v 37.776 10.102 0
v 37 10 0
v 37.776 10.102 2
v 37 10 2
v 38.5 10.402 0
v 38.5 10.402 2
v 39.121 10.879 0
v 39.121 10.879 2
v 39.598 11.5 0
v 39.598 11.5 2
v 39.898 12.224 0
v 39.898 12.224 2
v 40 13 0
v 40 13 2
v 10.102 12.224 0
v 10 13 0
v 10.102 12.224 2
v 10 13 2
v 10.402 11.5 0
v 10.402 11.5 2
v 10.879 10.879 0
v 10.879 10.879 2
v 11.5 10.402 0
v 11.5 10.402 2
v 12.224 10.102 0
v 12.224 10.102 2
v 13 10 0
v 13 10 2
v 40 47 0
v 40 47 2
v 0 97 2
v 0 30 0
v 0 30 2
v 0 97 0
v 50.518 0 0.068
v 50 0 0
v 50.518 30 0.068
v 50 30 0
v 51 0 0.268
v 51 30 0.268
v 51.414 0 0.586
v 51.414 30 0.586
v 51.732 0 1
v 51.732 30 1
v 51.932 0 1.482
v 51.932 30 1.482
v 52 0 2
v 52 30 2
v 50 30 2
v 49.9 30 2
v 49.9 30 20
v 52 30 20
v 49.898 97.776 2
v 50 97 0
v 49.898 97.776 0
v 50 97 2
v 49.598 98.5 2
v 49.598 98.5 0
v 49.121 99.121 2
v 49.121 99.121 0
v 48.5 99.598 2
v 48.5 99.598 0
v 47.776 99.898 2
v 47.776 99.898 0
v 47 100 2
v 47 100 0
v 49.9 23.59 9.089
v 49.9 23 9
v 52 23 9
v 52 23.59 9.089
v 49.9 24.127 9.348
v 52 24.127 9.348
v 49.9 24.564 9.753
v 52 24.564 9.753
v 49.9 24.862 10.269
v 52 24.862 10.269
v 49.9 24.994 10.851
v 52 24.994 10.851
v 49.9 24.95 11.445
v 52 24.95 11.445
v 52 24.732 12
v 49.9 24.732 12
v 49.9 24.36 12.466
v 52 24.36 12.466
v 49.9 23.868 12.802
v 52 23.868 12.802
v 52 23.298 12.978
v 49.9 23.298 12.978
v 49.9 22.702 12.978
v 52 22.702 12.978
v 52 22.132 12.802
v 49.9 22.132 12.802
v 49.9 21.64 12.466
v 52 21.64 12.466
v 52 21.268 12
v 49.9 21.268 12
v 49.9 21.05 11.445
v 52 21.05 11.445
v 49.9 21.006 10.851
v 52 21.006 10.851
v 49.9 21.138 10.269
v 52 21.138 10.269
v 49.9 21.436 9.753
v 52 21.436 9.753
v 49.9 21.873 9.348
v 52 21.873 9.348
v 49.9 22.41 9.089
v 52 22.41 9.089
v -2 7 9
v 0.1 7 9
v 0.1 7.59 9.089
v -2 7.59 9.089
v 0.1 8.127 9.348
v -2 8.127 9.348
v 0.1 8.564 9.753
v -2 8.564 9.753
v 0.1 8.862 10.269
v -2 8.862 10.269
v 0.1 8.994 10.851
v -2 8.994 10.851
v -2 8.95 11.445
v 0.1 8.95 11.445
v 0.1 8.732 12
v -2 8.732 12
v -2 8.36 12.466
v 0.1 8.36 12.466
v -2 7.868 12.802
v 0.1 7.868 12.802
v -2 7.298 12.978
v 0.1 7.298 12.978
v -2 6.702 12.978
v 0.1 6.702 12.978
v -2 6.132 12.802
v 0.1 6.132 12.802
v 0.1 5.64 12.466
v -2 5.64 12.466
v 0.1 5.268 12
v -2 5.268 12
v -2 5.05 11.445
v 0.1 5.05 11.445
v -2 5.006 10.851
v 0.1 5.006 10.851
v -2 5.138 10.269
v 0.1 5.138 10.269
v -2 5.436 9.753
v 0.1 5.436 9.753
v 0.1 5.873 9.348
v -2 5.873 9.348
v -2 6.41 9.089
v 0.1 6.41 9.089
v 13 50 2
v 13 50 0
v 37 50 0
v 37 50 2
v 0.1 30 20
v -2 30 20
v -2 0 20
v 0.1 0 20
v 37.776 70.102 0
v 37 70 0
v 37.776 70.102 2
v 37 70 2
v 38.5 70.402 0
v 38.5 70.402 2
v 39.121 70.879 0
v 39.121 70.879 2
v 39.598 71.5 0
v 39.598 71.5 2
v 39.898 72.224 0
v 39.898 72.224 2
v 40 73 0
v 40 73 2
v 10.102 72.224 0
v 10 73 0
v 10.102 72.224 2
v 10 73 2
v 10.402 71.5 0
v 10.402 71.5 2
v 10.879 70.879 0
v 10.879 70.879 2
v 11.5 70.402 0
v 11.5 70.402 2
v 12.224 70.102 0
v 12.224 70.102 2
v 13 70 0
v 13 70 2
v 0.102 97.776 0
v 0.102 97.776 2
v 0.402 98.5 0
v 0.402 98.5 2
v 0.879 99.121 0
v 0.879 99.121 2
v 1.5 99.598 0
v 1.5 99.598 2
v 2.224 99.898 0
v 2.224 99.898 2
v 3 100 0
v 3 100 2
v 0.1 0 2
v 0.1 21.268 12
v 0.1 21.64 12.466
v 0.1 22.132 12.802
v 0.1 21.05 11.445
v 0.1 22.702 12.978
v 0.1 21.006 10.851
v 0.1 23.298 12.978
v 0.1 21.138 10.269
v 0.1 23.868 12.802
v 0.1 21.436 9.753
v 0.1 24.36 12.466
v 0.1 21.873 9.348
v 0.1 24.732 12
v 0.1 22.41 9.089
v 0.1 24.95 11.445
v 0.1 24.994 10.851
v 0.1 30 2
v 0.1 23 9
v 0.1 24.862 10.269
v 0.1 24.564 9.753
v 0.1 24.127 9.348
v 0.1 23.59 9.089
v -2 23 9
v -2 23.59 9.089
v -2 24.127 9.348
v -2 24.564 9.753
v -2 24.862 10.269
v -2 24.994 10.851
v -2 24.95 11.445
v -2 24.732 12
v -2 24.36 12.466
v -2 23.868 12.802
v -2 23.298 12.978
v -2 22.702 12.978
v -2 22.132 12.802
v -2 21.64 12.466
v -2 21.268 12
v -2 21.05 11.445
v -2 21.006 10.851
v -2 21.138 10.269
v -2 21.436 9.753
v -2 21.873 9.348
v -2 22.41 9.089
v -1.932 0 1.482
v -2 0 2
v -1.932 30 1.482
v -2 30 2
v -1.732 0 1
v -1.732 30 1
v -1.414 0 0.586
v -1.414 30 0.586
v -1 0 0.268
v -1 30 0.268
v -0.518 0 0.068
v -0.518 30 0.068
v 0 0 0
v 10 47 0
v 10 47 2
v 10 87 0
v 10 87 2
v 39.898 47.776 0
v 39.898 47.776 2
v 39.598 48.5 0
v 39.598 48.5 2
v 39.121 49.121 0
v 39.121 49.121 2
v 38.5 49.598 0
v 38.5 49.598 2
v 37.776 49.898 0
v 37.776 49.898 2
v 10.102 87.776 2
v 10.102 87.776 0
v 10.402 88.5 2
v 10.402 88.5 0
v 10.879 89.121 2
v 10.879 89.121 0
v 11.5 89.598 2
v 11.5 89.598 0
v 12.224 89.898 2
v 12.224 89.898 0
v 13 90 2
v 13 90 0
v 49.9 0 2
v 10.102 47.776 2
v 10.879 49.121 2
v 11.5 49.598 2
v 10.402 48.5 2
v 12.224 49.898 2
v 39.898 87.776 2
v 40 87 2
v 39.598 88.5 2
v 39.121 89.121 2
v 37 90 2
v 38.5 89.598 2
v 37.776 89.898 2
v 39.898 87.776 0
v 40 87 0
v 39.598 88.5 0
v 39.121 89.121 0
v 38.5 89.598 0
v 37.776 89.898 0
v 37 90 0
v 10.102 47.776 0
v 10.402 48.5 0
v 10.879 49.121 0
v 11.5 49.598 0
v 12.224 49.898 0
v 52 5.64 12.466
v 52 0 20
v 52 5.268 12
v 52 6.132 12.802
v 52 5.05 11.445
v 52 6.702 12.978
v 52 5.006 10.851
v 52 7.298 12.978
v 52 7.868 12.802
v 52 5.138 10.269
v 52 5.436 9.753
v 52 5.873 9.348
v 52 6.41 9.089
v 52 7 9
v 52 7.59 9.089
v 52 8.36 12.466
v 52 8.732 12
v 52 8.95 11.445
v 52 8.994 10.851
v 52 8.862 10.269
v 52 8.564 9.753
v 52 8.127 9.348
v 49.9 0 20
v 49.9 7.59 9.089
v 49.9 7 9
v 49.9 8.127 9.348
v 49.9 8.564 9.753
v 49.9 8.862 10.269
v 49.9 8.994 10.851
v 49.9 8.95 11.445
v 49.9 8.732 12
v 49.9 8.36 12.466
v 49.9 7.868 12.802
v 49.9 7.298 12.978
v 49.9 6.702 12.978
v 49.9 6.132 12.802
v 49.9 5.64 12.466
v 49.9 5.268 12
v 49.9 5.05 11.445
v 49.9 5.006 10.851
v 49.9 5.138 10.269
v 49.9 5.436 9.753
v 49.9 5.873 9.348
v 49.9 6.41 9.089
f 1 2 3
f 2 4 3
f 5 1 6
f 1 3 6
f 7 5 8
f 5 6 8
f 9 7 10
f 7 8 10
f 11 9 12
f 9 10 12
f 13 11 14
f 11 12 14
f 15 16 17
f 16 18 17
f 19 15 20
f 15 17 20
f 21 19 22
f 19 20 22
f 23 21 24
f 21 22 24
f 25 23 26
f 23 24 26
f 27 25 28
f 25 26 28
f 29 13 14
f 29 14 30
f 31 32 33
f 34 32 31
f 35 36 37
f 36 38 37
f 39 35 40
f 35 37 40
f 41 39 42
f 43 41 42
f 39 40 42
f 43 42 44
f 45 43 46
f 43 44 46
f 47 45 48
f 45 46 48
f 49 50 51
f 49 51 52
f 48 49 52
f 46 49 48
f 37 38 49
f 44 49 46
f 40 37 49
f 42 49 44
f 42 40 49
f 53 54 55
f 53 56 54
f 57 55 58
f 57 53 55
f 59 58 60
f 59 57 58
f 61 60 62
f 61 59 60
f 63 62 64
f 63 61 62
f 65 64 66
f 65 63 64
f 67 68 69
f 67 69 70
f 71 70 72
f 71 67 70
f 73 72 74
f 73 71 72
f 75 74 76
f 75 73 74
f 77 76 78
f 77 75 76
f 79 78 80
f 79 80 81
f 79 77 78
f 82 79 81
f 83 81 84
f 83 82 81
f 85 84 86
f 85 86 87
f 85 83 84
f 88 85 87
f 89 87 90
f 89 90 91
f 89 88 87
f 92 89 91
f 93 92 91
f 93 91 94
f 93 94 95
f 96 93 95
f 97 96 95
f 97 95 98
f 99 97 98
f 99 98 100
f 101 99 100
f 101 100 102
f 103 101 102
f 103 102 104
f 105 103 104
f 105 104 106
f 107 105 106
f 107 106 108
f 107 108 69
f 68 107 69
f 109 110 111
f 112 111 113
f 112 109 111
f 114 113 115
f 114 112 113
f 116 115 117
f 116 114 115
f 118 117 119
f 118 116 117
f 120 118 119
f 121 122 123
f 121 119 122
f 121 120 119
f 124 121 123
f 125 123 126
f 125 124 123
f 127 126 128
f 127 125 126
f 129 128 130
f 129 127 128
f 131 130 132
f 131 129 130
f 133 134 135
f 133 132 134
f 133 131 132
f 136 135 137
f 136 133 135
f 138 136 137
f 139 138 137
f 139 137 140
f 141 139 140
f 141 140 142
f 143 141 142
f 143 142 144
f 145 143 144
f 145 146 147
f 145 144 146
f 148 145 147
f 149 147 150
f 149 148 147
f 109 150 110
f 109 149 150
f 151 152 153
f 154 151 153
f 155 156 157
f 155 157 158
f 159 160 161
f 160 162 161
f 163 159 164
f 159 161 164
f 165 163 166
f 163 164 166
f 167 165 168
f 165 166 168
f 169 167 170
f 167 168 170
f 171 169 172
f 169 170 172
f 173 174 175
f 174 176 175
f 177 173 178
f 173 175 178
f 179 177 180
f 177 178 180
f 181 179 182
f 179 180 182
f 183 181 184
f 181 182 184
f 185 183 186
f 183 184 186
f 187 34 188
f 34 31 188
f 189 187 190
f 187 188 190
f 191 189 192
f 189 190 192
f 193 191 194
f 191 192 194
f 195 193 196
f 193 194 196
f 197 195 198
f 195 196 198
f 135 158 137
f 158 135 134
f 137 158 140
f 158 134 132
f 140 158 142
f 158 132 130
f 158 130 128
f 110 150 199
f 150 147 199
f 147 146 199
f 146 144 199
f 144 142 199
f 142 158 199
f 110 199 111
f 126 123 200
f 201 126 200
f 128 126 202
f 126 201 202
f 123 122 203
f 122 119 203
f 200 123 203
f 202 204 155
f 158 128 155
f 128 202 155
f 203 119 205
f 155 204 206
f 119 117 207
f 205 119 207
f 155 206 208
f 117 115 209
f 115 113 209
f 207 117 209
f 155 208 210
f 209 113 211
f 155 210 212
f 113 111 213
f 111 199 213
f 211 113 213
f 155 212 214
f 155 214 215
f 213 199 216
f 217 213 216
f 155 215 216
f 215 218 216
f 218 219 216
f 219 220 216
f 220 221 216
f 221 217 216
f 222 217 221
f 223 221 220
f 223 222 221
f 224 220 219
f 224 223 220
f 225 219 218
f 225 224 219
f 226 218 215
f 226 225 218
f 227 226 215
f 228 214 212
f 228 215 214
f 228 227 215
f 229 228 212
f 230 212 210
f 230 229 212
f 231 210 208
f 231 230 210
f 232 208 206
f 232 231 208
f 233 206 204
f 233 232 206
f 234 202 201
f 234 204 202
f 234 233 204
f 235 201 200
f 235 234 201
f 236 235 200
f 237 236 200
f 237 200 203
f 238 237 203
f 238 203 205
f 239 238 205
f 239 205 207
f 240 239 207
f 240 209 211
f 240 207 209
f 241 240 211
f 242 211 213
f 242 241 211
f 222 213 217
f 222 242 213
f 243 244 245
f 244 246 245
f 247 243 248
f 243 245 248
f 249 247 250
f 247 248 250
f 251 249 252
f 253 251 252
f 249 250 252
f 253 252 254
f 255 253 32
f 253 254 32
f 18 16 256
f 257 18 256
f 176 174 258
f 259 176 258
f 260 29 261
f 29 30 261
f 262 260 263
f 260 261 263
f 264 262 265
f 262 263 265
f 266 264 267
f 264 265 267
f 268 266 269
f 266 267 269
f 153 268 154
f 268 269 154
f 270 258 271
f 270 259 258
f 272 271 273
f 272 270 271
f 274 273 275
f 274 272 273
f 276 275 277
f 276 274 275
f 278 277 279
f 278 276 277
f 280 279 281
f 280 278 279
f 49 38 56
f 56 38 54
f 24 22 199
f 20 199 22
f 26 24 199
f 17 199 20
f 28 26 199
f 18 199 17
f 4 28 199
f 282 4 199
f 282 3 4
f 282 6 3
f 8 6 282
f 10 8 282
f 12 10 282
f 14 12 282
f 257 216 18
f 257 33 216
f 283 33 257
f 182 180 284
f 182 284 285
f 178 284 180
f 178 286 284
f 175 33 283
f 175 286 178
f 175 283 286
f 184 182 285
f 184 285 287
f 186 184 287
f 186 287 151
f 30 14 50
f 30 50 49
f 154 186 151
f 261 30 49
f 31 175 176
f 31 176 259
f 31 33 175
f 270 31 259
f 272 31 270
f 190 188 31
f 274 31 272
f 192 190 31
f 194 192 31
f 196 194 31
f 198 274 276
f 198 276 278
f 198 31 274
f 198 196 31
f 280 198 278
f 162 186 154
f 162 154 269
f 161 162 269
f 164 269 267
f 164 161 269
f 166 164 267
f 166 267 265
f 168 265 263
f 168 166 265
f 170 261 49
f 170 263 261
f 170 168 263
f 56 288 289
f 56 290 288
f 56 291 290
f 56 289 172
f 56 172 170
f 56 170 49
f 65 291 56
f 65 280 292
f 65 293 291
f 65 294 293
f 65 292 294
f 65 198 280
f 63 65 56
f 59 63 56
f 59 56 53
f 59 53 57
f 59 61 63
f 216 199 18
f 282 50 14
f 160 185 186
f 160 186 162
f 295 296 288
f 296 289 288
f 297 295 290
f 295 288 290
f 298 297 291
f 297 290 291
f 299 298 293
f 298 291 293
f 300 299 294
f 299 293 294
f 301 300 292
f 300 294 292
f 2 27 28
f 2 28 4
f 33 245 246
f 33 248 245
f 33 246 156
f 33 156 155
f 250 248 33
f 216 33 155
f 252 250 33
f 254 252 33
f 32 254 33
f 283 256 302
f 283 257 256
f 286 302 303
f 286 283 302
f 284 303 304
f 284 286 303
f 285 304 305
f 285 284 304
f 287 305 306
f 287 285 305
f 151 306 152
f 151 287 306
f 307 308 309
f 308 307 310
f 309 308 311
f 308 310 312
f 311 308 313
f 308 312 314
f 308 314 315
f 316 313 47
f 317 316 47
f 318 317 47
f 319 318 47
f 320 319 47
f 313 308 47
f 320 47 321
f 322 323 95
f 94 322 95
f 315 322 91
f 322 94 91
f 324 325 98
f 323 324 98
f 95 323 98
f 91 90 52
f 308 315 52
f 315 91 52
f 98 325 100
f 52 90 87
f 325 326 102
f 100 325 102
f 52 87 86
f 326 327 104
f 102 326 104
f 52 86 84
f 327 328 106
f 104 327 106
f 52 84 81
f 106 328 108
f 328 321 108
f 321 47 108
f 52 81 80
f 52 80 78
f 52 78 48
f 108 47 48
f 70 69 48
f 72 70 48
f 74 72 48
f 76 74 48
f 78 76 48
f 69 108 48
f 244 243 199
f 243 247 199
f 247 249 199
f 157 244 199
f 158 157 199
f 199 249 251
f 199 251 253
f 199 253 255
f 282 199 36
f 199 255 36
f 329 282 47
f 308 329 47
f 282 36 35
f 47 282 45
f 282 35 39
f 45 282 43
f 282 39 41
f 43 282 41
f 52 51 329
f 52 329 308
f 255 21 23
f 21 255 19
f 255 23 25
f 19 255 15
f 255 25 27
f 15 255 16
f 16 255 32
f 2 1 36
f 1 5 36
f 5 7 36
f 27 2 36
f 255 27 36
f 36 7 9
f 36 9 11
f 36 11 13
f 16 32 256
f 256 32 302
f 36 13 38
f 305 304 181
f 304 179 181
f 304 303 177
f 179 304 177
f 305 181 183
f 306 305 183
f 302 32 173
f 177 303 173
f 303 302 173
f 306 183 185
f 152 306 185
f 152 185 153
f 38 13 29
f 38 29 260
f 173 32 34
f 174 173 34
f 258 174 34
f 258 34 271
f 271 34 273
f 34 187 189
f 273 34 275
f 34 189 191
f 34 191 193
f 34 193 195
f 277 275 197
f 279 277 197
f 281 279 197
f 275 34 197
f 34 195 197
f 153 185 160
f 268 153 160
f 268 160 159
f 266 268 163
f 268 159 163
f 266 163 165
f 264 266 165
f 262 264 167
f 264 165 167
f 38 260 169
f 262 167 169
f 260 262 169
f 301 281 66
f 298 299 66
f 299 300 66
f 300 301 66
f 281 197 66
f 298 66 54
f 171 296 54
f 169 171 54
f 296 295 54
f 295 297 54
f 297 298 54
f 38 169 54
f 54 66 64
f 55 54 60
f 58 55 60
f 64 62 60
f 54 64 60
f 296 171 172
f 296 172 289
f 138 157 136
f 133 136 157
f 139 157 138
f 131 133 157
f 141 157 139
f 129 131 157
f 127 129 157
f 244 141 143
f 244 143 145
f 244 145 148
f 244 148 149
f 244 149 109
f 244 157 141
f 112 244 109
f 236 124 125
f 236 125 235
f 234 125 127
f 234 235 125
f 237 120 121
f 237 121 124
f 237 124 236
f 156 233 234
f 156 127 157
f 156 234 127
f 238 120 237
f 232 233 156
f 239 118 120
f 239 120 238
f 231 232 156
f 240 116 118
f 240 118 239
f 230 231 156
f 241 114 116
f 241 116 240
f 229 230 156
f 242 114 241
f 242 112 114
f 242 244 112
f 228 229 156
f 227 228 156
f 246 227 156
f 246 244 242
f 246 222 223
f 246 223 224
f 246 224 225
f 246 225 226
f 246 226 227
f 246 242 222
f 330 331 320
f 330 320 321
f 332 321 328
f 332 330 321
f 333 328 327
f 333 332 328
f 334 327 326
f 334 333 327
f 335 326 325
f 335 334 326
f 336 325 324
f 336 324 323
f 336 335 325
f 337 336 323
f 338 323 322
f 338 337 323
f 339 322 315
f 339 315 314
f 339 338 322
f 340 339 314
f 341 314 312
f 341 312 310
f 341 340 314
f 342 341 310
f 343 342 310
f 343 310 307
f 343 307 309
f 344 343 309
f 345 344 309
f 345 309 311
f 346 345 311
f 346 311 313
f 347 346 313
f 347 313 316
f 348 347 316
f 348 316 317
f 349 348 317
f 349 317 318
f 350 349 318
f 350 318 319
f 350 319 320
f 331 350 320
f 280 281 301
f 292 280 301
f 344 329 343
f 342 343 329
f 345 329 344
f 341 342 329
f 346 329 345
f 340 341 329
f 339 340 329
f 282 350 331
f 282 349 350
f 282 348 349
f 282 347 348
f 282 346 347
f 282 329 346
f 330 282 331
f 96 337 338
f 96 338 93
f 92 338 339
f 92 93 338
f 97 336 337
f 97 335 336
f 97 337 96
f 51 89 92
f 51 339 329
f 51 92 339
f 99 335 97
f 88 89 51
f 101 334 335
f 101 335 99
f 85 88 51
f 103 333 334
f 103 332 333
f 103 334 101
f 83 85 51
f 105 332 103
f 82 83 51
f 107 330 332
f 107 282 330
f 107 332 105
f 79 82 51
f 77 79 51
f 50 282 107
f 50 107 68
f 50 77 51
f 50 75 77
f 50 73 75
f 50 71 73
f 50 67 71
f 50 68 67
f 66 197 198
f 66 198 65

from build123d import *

# Parameters (mm, degrees)
BOX004_W          = 49.8
BOX004_H          = 30
BOX004_DEPTH      = 20
CYLINDER001_R     = 2
CYLINDER001_DEPTH = 54
CYLINDER_R        = 2
CYLINDER_DEPTH    = 54
BOX003_W          = 54
BOX003_H          = 30
BOX003_DEPTH      = 20
FILLET003_R       = 2
FILLET004_R       = 2
BOX002_W          = 30
BOX002_H          = 20
BOX002_DEPTH      = 2
FILLET002_R       = 3
BOX001_W          = 30
BOX001_H          = 40
BOX001_DEPTH      = 2
FILLET001_R       = 3
BOX_W             = 50
BOX_H             = 100
BOX_DEPTH         = 2
FILLET_R          = 3


with BuildPart() as cub004:
    # Box004 → Box004 (new body)
    with BuildSketch(Plane(origin=(2.1, 0, 0), x_dir=(1, 0, 0), z_dir=(0, 0, 1))):
        with Locations((24.9, 15)):
            Rectangle(BOX004_W, BOX004_H)
    extrude(amount=BOX004_DEPTH)


with BuildPart() as cilindre001:
    # Cylinder001 → Cylinder001 (new body)
    with BuildSketch(Plane(origin=(0, 23, 11), x_dir=(0, 0, -1), z_dir=(1, 0, 0))):
        Circle(CYLINDER001_R)
    extrude(amount=CYLINDER001_DEPTH)


with BuildPart() as cilindre:
    # Cylinder → Cylinder (new body)
    with BuildSketch(Plane(origin=(0, 7, 11), x_dir=(0, 0, -1), z_dir=(1, 0, 0))):
        Circle(CYLINDER_R)
    extrude(amount=CYLINDER_DEPTH)


with BuildPart() as fillet004:
    # Box003 → Box003 (new body)
    with BuildSketch(Plane.XY):
        with Locations((27, 15)):
            Rectangle(BOX003_W, BOX003_H)
    extrude(amount=BOX003_DEPTH)

    # Cut002: cut Cilindre
    add(cilindre.part, mode=Mode.SUBTRACT)

    # Cut003: cut Cilindre001
    add(cilindre001.part, mode=Mode.SUBTRACT)

    # Cut004: cut Cub004
    add(cub004.part, mode=Mode.SUBTRACT)

    # Fillet003
    fillet003_edges = [fillet004.edges().sort_by_distance(p)[0] for p in [
        (54, 15, 0),
    ]]
    fillet(fillet003_edges, radius=FILLET003_R)

    # Fillet004
    fillet004_edges = [fillet004.edges().sort_by_distance(p)[0] for p in [
        (0, 15, 0),
    ]]
    fillet(fillet004_edges, radius=FILLET004_R)


with BuildPart() as fillet004_1:
    # Fillet004 placement: moved
    add(fillet004.part.moved(Location((-2, 0, 0))))


with BuildPart() as fillet002:
    # Box002 → Box002 (new body)
    with BuildSketch(Plane(origin=(10, 70, 0), x_dir=(1, 0, 0), z_dir=(0, 0, 1))):
        with Locations((15, 10)):
            Rectangle(BOX002_W, BOX002_H)
    extrude(amount=BOX002_DEPTH)

    # Fillet002
    fillet002_edges = [fillet002.edges().sort_by_distance(p)[0] for p in [
        (10, 70, 1),
        (10, 90, 1),
        (40, 70, 1),
        (40, 90, 1),
    ]]
    fillet(fillet002_edges, radius=FILLET002_R)


with BuildPart() as fillet001:
    # Box001 → Box001 (new body)
    with BuildSketch(Plane(origin=(10, 10, 0), x_dir=(1, 0, 0), z_dir=(0, 0, 1))):
        with Locations((15, 20)):
            Rectangle(BOX001_W, BOX001_H)
    extrude(amount=BOX001_DEPTH)

    # Fillet001
    fillet001_edges = [fillet001.edges().sort_by_distance(p)[0] for p in [
        (10, 10, 1),
        (10, 50, 1),
        (40, 10, 1),
        (40, 50, 1),
    ]]
    fillet(fillet001_edges, radius=FILLET001_R)


with BuildPart() as fusion001:
    # Box → Box (new body)
    with BuildSketch(Plane.XY):
        with Locations((25, 50)):
            Rectangle(BOX_W, BOX_H)
    extrude(amount=BOX_DEPTH)

    # Fillet
    fillet_edges = [fusion001.edges().sort_by_distance(p)[0] for p in [
        (0, 100, 1),
        (50, 100, 1),
    ]]
    fillet(fillet_edges, radius=FILLET_R)

    # Cut: cut Fillet001
    add(fillet001.part, mode=Mode.SUBTRACT)

    # Cut001: cut Fillet002
    add(fillet002.part, mode=Mode.SUBTRACT)

    # Fusion: union Fillet004
    add(fillet004_1.part)


solid = fusion001.part
